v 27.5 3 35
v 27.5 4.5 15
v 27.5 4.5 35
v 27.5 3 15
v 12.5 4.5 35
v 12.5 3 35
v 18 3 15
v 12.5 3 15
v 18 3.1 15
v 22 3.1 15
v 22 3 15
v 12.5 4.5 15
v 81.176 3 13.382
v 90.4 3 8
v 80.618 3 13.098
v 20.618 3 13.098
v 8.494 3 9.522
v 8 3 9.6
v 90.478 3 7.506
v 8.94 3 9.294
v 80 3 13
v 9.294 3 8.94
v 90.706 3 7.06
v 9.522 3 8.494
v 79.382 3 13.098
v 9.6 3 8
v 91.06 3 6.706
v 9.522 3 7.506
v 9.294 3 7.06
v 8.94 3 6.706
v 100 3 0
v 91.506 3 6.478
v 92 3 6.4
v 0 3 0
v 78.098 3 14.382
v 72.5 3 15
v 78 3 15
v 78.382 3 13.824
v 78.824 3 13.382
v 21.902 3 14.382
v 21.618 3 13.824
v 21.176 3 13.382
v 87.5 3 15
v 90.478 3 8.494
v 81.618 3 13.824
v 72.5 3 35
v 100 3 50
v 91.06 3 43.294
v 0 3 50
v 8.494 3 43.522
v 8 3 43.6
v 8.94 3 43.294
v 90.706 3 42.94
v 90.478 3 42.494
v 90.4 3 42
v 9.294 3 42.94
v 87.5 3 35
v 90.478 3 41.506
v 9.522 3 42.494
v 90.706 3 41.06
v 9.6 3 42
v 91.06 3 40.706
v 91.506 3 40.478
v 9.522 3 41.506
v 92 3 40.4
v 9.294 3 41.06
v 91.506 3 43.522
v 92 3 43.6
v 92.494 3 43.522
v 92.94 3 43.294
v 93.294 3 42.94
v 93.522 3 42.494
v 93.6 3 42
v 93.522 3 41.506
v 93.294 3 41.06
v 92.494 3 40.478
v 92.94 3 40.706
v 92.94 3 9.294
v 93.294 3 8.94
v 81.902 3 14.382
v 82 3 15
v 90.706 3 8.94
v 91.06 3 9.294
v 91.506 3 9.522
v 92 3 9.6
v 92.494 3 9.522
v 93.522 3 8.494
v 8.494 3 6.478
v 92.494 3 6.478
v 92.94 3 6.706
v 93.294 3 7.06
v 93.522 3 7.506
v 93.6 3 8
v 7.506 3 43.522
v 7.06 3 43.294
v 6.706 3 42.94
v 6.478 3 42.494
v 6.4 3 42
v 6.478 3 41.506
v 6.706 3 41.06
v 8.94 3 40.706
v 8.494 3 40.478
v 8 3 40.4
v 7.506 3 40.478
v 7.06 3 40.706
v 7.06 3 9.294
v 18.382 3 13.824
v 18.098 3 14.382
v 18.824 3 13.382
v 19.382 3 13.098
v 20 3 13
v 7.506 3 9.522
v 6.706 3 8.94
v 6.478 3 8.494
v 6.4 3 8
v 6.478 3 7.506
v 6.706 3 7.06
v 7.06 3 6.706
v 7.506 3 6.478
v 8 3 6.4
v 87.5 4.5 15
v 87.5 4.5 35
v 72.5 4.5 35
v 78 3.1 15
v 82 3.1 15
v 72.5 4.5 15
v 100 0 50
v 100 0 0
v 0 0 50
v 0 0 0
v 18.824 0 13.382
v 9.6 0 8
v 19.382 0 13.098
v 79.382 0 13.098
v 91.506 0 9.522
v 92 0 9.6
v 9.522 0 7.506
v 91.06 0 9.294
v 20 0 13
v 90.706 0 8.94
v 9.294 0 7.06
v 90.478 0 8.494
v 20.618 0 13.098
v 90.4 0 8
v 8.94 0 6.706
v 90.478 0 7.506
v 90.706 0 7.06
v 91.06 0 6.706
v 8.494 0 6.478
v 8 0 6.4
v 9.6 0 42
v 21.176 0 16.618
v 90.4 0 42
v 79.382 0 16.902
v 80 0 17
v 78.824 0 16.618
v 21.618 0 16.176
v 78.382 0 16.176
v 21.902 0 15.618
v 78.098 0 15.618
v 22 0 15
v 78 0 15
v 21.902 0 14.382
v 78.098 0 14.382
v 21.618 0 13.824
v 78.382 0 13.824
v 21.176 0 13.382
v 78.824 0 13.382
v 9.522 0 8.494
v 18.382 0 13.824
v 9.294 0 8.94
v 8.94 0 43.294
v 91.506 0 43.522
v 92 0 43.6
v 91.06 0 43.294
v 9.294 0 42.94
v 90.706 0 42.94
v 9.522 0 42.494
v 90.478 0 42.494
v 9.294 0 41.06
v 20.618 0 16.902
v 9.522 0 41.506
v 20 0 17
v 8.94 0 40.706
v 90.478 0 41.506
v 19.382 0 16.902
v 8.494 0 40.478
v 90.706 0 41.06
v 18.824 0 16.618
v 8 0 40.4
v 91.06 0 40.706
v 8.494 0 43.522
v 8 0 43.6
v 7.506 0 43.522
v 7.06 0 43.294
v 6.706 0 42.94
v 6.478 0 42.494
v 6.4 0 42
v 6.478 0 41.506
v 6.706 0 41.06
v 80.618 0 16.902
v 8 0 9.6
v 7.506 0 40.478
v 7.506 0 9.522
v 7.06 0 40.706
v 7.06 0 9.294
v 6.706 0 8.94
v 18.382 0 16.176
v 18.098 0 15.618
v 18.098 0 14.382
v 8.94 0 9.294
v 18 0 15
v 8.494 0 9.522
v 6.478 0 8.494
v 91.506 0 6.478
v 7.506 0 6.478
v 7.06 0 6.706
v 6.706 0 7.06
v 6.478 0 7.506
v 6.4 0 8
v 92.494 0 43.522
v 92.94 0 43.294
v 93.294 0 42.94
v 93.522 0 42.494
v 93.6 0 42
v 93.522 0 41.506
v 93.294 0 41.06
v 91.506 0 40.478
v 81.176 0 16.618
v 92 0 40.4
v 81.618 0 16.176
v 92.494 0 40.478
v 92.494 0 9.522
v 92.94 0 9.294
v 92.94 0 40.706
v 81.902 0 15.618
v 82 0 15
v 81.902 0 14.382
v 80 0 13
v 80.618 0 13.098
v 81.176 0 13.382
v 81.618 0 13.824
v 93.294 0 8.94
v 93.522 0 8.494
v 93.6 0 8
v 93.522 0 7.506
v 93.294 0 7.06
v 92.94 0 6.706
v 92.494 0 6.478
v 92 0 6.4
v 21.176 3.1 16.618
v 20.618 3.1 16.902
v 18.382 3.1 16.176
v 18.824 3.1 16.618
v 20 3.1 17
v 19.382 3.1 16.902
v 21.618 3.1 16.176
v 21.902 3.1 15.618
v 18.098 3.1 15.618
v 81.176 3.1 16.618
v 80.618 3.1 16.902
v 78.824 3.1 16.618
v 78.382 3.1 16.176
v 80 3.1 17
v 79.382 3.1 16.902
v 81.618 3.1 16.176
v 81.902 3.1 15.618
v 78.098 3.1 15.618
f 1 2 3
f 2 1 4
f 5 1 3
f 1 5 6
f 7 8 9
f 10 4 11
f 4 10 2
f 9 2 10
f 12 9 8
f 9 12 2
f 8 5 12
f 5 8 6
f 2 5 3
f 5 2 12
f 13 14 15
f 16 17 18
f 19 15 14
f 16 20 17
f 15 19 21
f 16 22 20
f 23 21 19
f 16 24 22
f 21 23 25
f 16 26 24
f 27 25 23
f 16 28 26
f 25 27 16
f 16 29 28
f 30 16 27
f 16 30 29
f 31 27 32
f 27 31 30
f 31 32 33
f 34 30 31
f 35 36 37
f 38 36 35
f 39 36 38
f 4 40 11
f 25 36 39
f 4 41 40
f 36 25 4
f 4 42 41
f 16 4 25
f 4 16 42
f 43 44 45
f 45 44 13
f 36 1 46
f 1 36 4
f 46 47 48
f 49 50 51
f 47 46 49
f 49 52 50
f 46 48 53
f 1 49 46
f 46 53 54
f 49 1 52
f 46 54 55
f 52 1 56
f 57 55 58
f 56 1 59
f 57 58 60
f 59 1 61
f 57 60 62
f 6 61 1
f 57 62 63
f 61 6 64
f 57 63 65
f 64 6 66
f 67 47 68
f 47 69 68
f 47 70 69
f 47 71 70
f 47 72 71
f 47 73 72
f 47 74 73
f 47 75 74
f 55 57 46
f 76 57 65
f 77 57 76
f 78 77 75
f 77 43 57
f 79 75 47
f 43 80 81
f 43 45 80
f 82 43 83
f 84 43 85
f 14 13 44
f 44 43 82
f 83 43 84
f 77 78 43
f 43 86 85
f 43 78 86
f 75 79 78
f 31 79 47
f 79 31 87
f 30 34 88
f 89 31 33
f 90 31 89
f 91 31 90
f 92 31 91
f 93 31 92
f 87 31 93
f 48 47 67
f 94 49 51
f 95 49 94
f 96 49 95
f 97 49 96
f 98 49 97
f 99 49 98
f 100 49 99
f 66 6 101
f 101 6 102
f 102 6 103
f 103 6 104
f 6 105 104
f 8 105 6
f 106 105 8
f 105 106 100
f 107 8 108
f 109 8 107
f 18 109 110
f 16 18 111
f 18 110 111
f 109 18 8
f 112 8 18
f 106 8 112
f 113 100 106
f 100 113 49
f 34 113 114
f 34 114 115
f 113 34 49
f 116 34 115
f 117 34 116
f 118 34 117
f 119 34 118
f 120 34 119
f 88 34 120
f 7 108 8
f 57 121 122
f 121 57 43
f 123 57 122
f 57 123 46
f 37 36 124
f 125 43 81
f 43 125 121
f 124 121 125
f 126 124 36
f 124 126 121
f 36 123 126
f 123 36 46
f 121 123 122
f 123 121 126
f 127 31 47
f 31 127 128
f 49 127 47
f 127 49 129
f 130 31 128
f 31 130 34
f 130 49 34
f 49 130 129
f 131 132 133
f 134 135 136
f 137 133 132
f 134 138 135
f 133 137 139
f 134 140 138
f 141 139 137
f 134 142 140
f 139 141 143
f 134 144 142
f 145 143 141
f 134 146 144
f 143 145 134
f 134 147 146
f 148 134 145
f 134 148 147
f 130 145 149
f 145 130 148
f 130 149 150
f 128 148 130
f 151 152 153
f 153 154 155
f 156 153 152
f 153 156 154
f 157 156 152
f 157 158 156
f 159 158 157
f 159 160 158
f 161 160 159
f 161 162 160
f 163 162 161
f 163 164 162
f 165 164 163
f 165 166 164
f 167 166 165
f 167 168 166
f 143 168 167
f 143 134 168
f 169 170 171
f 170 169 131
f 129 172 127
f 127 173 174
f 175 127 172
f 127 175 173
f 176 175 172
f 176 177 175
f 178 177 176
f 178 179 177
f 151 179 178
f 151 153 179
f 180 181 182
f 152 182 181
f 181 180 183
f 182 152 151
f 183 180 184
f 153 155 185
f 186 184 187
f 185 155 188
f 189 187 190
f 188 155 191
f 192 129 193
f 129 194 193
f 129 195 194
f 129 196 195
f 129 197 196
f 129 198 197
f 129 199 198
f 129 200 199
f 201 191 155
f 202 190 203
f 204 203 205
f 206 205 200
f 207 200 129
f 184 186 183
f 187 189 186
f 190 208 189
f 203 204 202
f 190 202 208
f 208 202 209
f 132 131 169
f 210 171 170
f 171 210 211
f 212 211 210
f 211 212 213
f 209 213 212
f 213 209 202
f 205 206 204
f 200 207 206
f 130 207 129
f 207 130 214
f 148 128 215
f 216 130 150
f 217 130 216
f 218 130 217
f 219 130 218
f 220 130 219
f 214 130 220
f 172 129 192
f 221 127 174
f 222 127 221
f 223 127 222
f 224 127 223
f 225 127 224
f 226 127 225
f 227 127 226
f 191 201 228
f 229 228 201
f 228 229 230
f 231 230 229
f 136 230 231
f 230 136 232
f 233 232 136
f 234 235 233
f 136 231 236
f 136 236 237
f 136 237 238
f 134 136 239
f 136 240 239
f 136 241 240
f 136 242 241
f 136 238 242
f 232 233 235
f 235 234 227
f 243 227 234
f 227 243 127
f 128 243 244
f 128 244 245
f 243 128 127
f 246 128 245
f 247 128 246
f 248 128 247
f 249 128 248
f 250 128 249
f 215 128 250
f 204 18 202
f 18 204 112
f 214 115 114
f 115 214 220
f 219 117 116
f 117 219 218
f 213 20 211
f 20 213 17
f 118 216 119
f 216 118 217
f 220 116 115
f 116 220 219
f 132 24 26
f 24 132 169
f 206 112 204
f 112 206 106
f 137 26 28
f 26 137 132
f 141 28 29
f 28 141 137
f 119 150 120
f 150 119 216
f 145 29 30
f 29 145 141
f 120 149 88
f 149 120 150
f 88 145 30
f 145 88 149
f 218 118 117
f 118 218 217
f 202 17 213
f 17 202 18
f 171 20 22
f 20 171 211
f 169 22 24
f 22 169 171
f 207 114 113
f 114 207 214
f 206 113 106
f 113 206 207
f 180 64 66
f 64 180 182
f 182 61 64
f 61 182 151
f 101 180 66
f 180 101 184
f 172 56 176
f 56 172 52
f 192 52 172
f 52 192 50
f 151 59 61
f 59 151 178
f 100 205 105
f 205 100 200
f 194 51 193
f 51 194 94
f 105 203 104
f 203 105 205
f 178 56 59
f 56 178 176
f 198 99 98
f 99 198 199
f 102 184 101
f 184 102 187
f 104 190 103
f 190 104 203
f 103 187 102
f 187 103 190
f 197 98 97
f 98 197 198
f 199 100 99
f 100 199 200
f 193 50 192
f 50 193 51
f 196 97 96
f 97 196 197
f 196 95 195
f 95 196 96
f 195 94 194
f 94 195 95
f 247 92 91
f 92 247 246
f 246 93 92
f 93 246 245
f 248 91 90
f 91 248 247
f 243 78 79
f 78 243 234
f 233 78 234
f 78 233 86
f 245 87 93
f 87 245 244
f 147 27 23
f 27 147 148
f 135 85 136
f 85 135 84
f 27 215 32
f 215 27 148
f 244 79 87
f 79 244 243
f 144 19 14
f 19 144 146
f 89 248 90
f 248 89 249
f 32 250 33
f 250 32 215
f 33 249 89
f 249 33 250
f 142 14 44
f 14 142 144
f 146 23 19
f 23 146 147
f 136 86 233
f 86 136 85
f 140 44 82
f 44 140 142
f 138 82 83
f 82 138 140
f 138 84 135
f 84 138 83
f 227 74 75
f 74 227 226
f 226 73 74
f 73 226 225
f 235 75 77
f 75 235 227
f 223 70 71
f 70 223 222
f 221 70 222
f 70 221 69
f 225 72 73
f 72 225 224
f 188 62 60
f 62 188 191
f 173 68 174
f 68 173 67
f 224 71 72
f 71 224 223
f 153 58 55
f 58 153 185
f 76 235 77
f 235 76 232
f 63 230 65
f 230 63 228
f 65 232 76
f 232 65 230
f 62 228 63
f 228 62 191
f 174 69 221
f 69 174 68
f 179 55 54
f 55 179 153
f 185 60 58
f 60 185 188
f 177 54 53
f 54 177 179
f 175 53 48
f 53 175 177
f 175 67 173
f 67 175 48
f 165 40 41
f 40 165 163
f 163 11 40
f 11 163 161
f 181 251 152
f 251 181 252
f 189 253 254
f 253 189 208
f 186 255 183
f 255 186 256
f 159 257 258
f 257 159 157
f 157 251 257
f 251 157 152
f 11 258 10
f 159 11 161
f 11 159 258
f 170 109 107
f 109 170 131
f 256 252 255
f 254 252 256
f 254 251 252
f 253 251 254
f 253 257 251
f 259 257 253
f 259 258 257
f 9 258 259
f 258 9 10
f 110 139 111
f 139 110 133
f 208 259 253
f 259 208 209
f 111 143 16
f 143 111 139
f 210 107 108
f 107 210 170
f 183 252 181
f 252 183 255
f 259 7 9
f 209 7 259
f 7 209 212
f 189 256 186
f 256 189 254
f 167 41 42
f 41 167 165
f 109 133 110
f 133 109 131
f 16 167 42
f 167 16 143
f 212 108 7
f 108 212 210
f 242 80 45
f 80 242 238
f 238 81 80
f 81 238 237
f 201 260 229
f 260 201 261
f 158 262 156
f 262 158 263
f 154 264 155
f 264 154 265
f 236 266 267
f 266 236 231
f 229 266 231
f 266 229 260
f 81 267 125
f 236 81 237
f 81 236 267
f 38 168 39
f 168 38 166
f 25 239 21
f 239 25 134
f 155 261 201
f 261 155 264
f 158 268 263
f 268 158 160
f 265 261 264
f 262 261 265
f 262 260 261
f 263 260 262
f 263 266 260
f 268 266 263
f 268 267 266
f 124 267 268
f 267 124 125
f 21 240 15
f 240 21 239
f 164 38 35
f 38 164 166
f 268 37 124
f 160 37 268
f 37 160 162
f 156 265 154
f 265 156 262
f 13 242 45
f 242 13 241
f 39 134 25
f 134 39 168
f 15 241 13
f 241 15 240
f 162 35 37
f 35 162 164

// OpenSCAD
// ============================================================================
// ROScar1 Charging Contact Plate — Mounts on Robot Rear
// ============================================================================
// A small plate with two copper-tape contact pads that mates with the
// pogo pins in the dock's contact wall.
//
// Print this and glue it to the robot's rear face, then apply copper tape
// over the two raised pads.
// ============================================================================

// Must match dock parameters
contact_spacing    = 60;    // mm, center-to-center (same as dock)
contact_height     = 35;    // mm from base plate top (same as dock)

// Robot rear plate dimensions
plate_width        = 100;   // mm
plate_height       = 50;    // mm
plate_thickness    = 3;     // mm

// Contact pad (raised area for copper tape)
pad_width          = 15;    // mm
pad_height         = 20;    // mm
pad_raise          = 1.5;   // mm (proud of plate surface)

// Mounting holes
mount_hole_dia     = 3.2;   // mm (M3)

// Wire routing
wire_hole_dia      = 4;     // mm

module contact_plate() {
    difference() {
        union() {
            // Main plate
            cube([plate_width, plate_thickness, plate_height], center = false);

            // Raised contact pads
            for (offset = [-1, 1]) {
                translate([plate_width/2 + offset * contact_spacing/2 - pad_width/2,
                           plate_thickness,
                           plate_height/2 - pad_height/2])
                    cube([pad_width, pad_raise, pad_height]);
            }
        }

        // Mounting holes (4 corners)
        for (dx = [-1, 1]) {
            for (dz = [-1, 1]) {
                translate([plate_width/2 + dx * (plate_width/2 - 8),
                           -0.1,
                           plate_height/2 + dz * (plate_height/2 - 8)])
                    rotate([-90, 0, 0])
                    cylinder(h = plate_thickness + pad_raise + 0.2, d = mount_hole_dia, $fn = 20);
            }
        }

        // Wire holes behind each contact pad
        for (offset = [-1, 1]) {
            translate([plate_width/2 + offset * contact_spacing/2,
                       -0.1,
                       plate_height/2 - 10])
                rotate([-90, 0, 0])
                cylinder(h = plate_thickness + 0.2, d = wire_hole_dia, $fn = 20);
        }
    }
}

contact_plate();
